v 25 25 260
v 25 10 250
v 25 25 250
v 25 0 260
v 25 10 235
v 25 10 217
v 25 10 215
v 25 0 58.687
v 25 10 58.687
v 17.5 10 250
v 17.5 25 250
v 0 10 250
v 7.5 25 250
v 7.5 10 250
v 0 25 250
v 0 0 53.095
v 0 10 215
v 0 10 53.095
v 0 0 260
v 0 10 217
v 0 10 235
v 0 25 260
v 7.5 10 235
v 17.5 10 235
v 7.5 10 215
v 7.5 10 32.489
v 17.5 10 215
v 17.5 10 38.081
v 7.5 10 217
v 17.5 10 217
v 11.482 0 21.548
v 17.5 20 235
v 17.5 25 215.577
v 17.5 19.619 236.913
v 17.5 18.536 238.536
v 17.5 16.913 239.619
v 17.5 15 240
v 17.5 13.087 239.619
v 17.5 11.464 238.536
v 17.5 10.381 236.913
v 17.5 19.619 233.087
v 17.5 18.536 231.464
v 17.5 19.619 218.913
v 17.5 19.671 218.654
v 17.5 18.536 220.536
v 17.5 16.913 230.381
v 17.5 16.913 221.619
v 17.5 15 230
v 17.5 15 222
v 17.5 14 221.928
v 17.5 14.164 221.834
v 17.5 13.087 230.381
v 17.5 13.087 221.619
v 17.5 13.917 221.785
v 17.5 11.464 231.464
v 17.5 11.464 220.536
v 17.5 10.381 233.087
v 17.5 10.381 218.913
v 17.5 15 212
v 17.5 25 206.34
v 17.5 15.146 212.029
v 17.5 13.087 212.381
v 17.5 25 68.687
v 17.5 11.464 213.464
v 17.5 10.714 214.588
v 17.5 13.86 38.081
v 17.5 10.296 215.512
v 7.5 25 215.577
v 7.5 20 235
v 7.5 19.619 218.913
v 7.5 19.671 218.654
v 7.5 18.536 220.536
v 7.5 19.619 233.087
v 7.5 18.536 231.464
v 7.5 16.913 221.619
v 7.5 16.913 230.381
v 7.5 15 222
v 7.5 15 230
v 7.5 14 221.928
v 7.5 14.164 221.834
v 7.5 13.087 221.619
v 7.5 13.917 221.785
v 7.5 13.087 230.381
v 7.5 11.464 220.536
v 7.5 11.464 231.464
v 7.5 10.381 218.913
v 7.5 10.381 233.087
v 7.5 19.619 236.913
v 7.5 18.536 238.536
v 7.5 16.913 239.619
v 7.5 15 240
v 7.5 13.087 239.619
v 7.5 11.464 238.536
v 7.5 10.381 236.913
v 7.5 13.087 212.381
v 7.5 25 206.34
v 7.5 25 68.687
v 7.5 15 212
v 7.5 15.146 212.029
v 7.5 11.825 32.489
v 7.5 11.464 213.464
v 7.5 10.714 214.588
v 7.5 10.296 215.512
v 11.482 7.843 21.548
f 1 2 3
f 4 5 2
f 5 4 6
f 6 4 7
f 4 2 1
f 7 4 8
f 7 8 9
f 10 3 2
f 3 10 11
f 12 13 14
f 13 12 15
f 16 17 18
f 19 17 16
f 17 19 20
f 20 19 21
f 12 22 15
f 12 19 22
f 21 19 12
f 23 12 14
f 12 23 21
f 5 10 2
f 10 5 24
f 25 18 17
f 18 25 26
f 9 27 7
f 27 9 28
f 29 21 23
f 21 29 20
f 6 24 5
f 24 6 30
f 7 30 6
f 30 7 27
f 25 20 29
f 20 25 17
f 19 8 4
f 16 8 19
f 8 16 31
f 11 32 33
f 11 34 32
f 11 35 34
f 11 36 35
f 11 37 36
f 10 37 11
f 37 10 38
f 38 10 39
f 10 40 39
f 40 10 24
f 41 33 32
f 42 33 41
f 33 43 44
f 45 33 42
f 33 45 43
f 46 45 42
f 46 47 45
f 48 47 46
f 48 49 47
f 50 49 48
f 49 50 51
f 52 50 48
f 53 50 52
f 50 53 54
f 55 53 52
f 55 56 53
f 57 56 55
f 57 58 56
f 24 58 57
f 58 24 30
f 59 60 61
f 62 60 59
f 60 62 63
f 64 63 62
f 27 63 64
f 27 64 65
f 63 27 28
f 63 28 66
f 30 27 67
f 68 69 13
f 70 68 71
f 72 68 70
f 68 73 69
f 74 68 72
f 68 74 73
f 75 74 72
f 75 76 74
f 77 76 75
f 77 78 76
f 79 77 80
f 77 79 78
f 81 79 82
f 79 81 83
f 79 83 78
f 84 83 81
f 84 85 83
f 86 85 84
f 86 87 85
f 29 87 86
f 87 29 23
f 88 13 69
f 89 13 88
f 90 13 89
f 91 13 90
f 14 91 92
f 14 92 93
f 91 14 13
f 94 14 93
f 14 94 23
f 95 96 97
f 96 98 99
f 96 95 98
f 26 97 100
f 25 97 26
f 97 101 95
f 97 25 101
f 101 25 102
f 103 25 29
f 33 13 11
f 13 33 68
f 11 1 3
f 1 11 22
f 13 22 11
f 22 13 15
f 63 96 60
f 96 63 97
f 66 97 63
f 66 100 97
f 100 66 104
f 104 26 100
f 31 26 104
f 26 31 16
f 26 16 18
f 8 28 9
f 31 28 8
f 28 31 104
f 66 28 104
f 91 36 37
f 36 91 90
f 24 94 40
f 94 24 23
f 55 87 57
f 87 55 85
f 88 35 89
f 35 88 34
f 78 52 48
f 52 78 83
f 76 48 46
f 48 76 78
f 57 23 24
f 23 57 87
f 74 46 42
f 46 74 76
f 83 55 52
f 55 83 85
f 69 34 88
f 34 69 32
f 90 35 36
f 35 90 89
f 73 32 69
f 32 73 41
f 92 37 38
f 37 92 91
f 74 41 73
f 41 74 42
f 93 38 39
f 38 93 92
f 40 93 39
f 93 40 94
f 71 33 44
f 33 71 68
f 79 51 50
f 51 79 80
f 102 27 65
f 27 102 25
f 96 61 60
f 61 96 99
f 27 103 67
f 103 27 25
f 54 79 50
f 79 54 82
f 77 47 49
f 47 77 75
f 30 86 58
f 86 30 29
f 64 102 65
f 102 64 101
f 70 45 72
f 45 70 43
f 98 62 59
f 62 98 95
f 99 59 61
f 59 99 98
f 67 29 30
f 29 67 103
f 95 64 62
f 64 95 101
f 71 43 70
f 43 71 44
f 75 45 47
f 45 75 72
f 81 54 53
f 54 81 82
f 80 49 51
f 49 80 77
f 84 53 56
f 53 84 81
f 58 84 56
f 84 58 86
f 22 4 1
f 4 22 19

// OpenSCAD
// [FL_INDEX: keywords="openscad, 3d_parametric, Customizable_Tent_Spike, csg_solid" | COT="Parametric OpenSCAD design from 3DCodeverse"]
// Title: Customizable Tent Spike

//Customizable Tent Spike
// This is a simple open-source parametric tent spike


//CUSTOMIZER VARIABLES

//Defines the depth of spike in mm
d=250;// [60:300]

//CUSTOMIZER VARIABLES END

//Defines the width of spike base in mm
w=25; 

//Defines the height of spike base  in mm
h= 10; 

//Defines the width of spike spine in mm
p=10; 

//Defines the height of spike spine in mm
s=25; 

//Defines the hole radius in mm
r=5; 


module spike() 
{
difference(){
difference(){
difference(){
difference(){
difference(){
difference(){
union(){
cube([w,h,d]); // spike base
translate([w/2-p/2,0,0]) cube([p,s, d]); //spike spine
}
rotate([-20,0,0]) cube([w,50,150]); //blade front
}
translate ([0,0,-20])rotate([0,-20,0]) cube ([w,w,100]);//blade right
}
translate ([0,0,-10])rotate([0,20,0]) cube ([w,w,100]);//blade left
}
translate([0,s-h,d-15])rotate([0,90,0])cylinder (h=w,r=r); // hole
}
translate([0,p,d-35])rotate([-30,0,0]) cube([w,2*p,p-2]); //square cut
}
translate([0,s-h,d-33])rotate([0,90,0])cylinder (h=w,r=r); // bottom of square cut
}
translate([0,0,d]) cube([s,s,h]); // hammer pad
}

spike();
